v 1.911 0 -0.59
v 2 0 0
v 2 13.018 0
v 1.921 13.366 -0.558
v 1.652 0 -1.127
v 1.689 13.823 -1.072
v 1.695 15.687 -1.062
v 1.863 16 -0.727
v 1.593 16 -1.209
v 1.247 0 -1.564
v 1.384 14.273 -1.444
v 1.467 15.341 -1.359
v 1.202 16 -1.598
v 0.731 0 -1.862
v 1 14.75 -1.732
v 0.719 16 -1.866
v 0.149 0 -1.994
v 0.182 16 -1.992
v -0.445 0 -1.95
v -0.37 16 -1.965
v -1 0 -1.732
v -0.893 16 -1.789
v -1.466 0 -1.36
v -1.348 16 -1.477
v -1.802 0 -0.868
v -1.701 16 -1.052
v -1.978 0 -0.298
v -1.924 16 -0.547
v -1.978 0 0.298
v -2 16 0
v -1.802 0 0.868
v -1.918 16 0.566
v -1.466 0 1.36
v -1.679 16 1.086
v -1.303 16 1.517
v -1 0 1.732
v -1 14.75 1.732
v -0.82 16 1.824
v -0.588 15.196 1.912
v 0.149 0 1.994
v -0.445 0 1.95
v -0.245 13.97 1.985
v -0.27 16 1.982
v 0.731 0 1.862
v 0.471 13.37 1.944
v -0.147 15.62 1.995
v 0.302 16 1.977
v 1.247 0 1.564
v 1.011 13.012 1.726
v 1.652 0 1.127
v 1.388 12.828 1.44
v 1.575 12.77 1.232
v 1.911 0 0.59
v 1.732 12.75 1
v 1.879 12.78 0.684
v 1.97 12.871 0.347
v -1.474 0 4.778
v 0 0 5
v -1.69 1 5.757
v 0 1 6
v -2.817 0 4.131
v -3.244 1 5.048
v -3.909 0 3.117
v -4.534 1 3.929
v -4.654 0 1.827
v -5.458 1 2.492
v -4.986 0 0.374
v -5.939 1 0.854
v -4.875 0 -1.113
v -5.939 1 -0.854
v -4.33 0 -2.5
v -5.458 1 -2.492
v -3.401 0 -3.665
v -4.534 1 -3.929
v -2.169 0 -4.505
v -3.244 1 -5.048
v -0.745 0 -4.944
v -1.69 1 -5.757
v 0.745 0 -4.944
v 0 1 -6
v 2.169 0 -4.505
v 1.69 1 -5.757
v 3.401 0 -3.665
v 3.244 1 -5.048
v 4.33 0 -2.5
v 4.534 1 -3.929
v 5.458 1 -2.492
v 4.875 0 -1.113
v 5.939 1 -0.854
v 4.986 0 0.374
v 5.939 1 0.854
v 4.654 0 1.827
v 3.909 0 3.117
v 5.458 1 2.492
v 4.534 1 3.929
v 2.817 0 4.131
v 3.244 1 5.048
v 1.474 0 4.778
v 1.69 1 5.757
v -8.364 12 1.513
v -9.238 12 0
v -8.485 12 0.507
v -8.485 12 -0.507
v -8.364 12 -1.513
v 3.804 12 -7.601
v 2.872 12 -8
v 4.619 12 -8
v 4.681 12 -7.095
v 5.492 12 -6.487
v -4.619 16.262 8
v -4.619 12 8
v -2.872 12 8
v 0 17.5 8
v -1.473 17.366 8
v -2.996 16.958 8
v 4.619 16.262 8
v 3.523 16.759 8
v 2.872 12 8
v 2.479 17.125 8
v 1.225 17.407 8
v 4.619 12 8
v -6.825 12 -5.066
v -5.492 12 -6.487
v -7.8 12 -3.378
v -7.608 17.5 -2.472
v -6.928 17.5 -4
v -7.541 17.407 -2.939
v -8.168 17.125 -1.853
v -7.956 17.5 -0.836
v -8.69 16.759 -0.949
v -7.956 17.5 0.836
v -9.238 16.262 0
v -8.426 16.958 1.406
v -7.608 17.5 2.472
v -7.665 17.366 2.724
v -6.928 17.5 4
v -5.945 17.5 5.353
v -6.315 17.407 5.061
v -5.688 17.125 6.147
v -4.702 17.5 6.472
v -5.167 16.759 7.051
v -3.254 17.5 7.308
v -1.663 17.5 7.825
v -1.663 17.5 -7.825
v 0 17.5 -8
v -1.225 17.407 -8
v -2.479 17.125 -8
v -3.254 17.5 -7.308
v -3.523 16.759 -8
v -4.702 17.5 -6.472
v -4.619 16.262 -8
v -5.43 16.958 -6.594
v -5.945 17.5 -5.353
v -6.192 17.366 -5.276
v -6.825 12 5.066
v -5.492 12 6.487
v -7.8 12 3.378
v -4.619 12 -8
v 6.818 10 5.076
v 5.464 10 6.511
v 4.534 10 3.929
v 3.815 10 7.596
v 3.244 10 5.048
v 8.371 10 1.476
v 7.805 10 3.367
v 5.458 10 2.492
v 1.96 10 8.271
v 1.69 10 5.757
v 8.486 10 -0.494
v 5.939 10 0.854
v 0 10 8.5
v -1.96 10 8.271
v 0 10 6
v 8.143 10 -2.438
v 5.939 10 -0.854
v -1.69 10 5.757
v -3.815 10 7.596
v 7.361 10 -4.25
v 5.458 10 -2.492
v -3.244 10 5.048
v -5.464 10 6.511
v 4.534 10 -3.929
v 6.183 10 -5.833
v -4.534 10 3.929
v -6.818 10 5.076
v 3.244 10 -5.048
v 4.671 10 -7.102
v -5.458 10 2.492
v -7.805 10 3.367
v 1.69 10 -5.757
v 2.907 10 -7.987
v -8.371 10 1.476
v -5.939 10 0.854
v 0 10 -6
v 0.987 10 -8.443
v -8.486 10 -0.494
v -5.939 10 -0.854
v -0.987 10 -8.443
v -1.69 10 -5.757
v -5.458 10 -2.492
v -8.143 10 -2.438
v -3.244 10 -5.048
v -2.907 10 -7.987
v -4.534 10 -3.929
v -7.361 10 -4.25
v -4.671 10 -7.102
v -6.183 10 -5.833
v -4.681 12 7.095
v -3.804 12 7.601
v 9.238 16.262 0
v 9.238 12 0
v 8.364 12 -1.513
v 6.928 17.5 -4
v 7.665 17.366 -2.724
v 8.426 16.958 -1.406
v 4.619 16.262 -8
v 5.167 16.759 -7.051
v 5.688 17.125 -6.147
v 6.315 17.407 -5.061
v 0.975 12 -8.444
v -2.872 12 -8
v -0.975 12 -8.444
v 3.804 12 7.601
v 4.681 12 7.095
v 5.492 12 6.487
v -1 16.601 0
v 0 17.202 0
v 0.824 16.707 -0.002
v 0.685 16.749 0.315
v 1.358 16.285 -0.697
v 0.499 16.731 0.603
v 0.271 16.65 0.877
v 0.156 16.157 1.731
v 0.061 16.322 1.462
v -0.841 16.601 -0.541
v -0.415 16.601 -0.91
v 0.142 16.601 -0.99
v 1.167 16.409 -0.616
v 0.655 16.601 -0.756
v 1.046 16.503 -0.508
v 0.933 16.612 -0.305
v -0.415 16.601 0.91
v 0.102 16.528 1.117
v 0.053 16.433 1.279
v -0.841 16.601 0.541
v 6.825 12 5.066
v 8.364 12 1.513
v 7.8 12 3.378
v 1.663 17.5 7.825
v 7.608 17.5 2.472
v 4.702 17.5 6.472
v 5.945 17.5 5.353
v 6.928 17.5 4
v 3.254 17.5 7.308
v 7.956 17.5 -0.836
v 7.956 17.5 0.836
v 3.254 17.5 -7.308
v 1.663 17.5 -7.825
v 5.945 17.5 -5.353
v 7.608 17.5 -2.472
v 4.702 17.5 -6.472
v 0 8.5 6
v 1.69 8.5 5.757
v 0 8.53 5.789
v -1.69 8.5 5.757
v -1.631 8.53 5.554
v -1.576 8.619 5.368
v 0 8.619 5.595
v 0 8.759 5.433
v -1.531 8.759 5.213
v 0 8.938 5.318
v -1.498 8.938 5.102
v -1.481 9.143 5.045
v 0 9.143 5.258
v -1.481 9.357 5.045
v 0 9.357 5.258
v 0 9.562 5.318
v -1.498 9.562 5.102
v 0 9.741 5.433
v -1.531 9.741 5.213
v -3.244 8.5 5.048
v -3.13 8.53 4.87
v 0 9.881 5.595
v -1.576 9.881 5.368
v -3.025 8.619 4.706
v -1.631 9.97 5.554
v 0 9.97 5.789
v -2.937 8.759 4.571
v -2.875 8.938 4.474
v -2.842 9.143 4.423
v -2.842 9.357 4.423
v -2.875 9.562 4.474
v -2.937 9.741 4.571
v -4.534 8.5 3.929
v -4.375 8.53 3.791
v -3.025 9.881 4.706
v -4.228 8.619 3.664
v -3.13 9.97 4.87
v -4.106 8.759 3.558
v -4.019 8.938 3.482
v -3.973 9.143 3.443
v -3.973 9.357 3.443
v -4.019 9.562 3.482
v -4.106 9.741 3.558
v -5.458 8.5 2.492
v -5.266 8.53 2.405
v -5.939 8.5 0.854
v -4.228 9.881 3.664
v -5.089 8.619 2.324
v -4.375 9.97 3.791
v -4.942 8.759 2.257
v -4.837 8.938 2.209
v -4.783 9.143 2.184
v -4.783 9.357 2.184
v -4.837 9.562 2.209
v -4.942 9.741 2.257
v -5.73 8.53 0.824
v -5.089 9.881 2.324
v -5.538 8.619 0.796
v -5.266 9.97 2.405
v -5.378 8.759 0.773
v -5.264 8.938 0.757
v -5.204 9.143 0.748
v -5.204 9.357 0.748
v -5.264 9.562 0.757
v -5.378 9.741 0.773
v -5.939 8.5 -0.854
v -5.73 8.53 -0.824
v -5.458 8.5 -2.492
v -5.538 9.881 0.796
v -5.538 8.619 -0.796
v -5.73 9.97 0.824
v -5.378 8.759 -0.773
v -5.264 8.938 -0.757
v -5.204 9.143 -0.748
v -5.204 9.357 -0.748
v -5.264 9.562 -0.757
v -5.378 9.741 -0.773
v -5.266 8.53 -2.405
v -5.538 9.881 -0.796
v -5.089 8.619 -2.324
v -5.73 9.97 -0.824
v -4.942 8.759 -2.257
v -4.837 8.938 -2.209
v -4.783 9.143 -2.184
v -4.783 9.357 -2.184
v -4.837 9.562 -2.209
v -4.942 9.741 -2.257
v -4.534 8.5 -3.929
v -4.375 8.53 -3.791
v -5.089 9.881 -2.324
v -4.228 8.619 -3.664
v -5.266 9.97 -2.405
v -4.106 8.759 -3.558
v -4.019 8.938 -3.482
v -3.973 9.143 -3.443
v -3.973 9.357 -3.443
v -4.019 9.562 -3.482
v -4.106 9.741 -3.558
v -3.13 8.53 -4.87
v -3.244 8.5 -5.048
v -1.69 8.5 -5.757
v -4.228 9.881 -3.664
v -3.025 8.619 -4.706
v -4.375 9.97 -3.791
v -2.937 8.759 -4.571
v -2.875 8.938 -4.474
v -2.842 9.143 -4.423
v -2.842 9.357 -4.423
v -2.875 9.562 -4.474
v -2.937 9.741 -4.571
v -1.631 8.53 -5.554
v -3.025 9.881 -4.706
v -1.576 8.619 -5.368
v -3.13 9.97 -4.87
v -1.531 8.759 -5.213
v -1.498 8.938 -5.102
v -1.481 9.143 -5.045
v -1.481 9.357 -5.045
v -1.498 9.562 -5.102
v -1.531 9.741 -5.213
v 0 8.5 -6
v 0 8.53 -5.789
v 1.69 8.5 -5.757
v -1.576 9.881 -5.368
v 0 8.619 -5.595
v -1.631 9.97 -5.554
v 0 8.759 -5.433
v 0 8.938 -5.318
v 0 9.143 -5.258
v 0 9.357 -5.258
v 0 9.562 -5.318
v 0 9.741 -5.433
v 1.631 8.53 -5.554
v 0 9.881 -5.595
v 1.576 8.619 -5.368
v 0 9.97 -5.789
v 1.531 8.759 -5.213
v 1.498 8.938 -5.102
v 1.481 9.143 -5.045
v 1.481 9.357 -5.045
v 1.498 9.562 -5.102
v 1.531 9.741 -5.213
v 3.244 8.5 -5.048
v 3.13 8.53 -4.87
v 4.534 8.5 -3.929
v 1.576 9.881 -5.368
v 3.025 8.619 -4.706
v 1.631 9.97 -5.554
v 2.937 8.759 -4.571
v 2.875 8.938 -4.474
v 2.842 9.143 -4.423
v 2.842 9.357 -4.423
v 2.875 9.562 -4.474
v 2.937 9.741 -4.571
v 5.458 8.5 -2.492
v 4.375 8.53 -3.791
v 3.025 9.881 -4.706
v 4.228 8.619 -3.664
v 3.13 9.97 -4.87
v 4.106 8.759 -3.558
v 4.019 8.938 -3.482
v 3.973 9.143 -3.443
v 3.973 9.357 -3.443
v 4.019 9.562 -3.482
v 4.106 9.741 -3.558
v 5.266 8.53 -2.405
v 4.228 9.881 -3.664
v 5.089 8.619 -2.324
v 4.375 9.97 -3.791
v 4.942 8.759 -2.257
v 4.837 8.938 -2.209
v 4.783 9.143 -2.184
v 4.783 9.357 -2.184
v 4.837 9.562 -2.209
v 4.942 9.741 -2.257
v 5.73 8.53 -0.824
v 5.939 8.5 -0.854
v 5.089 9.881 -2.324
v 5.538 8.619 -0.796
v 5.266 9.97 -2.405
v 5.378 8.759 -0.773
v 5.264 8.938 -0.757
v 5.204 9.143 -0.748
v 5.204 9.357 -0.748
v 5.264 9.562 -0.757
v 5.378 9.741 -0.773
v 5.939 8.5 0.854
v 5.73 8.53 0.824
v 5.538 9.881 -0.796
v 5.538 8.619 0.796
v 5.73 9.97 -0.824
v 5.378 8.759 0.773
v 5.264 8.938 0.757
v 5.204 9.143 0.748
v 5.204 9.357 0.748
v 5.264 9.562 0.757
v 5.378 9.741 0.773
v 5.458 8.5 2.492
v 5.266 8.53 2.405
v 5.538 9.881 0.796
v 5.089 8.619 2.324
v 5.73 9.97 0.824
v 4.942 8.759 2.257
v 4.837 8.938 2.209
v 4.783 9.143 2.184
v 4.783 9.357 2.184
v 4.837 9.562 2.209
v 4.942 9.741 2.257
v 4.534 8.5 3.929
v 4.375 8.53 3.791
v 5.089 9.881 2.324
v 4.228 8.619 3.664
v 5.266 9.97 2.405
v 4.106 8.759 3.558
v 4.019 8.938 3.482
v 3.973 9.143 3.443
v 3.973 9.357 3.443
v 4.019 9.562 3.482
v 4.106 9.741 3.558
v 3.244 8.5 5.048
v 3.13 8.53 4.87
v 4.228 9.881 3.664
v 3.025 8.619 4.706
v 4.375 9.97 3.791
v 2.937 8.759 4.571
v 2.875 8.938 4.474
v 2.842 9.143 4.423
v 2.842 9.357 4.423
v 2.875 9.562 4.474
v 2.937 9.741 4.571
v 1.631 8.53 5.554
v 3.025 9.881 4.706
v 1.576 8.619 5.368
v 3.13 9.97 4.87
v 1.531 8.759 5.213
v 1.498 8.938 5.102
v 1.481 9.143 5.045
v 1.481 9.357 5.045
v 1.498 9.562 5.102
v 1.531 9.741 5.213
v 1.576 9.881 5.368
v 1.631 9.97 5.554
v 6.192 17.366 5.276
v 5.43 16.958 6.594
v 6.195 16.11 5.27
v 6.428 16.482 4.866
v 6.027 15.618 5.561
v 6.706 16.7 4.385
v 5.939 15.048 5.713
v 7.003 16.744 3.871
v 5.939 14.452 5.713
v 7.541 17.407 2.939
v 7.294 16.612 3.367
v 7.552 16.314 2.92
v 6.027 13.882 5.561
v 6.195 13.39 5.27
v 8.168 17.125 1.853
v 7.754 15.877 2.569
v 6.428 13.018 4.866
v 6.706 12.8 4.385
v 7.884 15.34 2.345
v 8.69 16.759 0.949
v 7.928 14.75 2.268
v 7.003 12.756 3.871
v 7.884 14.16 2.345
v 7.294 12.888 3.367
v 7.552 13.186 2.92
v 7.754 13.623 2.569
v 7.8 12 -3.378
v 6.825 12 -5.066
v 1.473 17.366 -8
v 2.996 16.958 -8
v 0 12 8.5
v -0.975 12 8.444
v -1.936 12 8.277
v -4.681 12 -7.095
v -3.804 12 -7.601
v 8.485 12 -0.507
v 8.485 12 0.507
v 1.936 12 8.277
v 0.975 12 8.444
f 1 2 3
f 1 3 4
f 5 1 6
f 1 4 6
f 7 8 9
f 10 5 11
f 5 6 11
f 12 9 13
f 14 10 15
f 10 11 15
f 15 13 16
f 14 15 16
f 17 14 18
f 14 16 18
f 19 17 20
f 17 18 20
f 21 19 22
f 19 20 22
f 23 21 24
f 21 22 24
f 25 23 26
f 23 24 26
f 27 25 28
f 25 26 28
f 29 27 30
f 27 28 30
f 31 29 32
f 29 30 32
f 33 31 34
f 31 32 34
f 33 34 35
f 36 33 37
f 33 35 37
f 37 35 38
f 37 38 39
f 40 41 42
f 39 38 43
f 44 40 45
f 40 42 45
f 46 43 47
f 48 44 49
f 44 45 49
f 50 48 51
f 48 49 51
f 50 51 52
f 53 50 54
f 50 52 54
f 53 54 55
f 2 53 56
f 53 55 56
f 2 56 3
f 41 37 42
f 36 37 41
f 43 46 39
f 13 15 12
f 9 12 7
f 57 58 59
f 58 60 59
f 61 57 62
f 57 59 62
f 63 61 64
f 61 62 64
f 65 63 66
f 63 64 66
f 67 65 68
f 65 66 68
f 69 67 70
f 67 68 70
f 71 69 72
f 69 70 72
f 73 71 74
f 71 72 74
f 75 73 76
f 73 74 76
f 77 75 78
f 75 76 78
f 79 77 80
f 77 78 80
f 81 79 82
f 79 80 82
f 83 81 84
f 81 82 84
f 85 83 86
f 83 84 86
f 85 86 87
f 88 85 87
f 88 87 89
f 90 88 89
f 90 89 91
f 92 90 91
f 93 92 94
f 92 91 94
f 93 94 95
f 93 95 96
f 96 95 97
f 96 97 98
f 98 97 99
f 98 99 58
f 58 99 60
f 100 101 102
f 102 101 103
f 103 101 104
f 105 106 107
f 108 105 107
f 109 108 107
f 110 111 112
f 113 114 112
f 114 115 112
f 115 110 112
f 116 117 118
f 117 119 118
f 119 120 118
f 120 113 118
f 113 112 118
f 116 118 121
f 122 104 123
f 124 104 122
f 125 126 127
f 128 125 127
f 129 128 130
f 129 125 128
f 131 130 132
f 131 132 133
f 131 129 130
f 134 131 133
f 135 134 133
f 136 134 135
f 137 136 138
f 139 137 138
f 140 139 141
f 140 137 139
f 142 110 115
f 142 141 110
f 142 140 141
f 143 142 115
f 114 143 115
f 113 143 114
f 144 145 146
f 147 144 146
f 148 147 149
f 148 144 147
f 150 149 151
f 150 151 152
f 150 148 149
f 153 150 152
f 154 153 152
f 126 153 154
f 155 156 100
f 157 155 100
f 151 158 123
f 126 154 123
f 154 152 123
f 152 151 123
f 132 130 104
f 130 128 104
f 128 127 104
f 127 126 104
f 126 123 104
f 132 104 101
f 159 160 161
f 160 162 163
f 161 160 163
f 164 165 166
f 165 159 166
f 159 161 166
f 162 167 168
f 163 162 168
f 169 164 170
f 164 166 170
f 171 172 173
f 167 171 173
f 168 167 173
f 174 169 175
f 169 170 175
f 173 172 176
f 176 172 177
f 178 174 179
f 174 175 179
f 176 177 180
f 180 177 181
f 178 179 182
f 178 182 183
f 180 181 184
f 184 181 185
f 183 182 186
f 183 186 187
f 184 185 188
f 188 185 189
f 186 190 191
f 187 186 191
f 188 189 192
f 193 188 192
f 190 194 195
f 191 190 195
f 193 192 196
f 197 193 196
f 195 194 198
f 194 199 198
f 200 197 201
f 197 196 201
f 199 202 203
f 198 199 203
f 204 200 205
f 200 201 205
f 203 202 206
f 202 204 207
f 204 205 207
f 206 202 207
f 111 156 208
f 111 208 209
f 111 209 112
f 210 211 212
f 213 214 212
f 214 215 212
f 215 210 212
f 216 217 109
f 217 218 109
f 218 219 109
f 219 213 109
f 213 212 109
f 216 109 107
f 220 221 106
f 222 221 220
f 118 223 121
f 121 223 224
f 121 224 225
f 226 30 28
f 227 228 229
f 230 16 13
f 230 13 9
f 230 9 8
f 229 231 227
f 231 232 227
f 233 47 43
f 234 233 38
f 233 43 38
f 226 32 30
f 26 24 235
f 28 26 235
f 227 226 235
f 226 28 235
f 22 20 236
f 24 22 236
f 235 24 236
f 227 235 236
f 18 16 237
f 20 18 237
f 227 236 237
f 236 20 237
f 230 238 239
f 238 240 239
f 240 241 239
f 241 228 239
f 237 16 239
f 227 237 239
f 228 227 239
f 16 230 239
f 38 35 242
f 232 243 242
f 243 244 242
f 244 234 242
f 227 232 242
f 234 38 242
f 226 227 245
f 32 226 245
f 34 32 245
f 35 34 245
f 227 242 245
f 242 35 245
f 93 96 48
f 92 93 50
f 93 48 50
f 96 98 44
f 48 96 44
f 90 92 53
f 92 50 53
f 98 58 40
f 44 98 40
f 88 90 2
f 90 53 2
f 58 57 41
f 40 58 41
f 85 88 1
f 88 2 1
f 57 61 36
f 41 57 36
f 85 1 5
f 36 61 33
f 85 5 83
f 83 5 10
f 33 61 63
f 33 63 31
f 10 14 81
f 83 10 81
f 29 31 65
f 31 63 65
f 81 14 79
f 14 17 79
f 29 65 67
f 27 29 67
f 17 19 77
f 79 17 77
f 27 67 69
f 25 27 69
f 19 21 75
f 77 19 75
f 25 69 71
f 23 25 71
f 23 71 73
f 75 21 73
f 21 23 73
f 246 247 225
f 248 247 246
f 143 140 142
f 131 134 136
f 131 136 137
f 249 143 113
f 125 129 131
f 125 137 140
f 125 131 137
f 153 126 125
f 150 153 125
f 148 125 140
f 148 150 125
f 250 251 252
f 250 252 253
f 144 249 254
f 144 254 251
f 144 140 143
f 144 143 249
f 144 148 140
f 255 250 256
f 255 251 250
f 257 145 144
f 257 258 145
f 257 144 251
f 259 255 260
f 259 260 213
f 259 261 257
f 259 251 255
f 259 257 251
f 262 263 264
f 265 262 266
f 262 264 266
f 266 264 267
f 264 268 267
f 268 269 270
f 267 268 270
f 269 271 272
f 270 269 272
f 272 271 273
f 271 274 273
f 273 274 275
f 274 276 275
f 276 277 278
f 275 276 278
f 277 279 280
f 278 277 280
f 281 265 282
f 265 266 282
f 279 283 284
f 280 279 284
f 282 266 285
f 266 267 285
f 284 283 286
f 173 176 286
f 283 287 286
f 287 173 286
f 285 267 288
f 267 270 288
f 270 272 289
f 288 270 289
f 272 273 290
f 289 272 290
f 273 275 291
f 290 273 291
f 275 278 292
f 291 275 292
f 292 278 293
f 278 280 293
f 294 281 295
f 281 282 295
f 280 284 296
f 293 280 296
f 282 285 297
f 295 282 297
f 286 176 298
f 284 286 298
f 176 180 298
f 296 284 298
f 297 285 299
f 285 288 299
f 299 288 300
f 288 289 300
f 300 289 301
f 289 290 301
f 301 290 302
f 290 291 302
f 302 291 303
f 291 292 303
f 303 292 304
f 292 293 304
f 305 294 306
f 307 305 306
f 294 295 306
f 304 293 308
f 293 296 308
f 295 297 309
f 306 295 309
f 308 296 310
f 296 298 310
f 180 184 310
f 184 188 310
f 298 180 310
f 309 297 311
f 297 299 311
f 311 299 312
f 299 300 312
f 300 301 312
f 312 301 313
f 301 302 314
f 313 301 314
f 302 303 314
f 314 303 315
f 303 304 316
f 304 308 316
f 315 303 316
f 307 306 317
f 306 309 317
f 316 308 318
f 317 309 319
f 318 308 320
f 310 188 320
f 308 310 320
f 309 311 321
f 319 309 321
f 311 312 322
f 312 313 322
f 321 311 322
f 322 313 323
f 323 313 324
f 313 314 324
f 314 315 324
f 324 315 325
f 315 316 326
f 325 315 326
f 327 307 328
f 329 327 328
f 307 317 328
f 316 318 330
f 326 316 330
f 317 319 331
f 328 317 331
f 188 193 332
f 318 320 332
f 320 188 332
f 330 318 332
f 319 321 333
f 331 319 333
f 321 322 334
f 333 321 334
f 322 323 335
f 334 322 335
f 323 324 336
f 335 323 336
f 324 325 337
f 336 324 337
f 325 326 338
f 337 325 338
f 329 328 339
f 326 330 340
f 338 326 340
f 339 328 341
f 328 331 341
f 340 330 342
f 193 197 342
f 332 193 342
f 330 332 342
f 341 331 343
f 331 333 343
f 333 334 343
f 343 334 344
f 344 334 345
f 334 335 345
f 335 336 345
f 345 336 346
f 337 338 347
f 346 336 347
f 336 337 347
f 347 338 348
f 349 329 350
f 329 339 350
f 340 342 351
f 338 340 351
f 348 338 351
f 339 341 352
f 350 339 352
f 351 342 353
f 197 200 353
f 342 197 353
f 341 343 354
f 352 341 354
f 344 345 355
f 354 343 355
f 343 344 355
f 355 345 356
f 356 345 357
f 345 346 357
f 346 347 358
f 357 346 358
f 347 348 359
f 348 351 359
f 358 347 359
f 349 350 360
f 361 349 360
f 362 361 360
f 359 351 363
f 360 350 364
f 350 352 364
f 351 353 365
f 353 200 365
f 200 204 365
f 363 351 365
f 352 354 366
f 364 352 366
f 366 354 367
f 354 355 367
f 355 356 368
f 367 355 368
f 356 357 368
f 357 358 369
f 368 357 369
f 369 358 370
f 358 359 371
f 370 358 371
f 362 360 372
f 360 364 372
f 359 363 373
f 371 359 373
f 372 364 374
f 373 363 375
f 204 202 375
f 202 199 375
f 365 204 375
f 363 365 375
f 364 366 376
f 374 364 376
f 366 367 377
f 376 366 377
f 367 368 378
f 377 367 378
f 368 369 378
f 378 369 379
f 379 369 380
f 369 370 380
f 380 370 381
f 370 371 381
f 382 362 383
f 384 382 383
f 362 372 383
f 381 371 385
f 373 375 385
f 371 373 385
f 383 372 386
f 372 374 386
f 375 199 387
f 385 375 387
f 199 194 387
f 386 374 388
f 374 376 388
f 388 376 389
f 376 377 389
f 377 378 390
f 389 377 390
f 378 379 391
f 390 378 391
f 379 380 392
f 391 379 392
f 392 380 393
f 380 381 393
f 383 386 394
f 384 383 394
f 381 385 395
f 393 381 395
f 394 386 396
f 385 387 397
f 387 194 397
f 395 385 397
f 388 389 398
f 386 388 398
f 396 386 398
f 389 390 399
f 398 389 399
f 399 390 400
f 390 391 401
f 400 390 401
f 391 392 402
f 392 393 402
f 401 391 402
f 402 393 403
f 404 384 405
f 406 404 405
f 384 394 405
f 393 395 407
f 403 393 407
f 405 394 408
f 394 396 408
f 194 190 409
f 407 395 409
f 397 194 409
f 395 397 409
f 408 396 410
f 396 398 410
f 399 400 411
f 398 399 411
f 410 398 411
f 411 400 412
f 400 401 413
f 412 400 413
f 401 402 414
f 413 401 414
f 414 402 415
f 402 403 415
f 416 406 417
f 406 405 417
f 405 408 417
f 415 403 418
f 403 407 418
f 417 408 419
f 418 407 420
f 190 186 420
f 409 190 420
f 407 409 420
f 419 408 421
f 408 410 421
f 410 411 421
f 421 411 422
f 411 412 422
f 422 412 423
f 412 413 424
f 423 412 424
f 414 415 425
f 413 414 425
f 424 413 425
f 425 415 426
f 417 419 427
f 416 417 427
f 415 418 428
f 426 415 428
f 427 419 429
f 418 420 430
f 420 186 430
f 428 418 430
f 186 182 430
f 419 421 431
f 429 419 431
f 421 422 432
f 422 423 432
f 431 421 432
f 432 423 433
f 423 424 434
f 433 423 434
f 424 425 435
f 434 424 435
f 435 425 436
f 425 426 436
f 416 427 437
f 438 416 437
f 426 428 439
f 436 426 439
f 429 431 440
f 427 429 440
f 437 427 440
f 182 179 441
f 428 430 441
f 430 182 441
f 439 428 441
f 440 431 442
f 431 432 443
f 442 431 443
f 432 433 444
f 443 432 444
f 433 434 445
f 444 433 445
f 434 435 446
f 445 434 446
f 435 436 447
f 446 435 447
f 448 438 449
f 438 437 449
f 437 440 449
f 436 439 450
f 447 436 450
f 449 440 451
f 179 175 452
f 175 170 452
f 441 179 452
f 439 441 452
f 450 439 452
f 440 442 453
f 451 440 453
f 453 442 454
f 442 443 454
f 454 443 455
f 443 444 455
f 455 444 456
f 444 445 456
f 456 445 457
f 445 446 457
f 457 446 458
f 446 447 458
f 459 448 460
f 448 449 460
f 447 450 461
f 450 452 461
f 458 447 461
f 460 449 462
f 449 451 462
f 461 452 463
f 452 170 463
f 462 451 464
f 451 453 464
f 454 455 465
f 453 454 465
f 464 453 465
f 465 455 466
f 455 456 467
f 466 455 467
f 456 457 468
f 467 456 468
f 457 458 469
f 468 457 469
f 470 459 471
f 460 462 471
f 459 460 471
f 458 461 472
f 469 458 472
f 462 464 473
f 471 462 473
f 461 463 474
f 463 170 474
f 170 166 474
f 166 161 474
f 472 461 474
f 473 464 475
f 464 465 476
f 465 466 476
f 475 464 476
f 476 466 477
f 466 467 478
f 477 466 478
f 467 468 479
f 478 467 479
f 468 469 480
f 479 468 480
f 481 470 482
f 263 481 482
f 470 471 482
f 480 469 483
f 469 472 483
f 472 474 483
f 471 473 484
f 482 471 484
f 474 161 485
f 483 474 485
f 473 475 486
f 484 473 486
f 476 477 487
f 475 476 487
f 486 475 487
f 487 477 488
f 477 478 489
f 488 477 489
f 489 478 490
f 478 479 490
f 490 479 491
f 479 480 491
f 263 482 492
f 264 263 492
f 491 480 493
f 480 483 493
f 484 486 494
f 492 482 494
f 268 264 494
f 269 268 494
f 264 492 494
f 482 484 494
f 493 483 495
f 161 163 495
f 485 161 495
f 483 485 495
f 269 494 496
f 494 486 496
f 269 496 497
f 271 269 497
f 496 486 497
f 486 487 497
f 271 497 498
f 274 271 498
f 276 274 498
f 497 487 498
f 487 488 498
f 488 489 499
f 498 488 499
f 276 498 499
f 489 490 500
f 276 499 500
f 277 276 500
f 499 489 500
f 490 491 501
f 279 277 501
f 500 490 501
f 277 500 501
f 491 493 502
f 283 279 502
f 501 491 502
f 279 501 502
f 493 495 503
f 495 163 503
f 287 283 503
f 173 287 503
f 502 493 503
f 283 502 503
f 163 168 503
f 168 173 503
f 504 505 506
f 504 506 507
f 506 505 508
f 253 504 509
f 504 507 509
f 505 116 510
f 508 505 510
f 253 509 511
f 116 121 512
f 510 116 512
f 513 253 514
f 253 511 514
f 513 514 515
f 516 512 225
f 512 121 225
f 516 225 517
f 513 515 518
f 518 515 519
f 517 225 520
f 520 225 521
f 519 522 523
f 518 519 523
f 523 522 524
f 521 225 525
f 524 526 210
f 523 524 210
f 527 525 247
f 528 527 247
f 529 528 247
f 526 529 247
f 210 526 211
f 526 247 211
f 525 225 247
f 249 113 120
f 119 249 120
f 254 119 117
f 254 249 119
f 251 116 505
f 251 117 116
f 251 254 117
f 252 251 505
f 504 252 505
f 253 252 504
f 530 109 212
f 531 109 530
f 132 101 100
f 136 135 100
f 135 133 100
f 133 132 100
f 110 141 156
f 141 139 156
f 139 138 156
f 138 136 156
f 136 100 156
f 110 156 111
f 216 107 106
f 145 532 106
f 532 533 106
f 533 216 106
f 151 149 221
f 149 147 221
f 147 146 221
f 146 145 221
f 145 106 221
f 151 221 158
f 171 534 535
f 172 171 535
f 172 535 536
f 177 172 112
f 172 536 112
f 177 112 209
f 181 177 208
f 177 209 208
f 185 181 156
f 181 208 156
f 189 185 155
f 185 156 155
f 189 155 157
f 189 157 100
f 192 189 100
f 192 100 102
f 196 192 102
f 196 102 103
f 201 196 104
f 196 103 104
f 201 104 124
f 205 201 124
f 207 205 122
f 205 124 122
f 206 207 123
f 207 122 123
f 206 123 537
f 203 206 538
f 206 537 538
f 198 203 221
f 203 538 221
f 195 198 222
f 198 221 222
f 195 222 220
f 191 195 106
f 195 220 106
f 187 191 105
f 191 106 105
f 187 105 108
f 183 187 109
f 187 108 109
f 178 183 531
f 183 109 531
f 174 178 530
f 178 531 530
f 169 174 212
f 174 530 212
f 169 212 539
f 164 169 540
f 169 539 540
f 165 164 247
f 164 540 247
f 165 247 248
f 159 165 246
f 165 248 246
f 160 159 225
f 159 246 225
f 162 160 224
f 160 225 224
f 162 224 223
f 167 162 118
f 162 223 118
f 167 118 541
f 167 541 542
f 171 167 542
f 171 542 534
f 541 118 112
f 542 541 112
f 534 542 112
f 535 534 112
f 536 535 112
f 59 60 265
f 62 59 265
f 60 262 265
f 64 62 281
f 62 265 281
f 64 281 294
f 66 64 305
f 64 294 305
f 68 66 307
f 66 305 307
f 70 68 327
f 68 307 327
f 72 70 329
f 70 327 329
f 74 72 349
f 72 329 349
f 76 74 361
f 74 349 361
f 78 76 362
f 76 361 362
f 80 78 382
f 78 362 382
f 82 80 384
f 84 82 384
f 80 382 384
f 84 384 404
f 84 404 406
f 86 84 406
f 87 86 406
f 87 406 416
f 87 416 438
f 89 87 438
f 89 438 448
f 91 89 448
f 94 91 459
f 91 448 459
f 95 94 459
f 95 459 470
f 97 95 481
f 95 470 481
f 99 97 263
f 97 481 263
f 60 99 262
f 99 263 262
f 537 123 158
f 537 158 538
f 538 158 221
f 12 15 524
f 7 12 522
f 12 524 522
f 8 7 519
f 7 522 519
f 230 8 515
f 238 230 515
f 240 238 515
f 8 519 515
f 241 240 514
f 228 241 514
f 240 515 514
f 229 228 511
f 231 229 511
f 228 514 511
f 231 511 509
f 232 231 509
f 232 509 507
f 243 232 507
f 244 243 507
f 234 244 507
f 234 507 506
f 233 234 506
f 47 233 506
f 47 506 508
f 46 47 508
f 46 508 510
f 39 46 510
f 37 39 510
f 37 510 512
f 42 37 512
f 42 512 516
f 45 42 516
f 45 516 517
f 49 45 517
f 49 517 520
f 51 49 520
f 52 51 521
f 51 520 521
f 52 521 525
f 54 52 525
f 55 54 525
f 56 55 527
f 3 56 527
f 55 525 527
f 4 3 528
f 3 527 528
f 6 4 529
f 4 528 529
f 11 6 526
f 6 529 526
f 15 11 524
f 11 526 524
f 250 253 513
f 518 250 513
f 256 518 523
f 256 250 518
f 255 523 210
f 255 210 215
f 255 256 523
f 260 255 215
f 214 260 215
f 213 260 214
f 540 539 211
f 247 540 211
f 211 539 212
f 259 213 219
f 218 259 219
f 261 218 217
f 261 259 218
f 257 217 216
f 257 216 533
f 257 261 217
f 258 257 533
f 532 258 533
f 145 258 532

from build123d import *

# Parameters (mm, degrees)
BOSS_EXTRUDE1_DEPTH       = 5.5
SKETCH3_OUTSIDE_W         = 37.596
SKETCH3_OUTSIDE_H         = 36.12
SKETCH3_OUTSIDE_R         = 8
CUT_EXTRUDE1_DEPTH        = 5.5
CUT_EXTRUDE1_DRAFT        = -45
F_4_0MM_DOWEL_HOLE1_D     = 4
F_4_0MM_DOWEL_HOLE1_DEPTH = 16
F_4_0MM_DOWEL_HOLE1_TIP   = 1.201721238
CUT_EXTRUDE2_REACH        = 28.904
SKETCH6_R                 = 2


with BuildPart() as part:
    # Sketch1 → Revolve1 (revolve)
    with BuildSketch(Plane.XY, mode=Mode.PRIVATE) as revolve1_sk:
        with BuildLine():
            Line((0, 0), (-5, 0))
            Line((-5, 0), (-6, 1))
            Line((-6, 1), (-6, 8.5))
            ThreePointArc((-6, 8.5), (-5.25, 9.25), (-6, 10))
            Line((-6, 10), (-8.5, 10))
            Line((-8.5, 10), (-8.5, 12))
            Line((-8.5, 12), (0, 12))
            Line((0, 12), (0, 0))
        make_face()
    revolve(revolve1_sk.sketch.rotate(Axis((0, 12, 0), (0, -1, 0)), 270), axis=Axis((0, 12, 0), (0, -1, 0)))

    # Sketch2 → Boss-Extrude1 (add)
    with BuildSketch(Plane(origin=(0, 12, 0), x_dir=(1, 0, 0), z_dir=(0, 1, 0))):
        Polygon((-4.618802154, 8), (-9.237604307, 0), (-4.618802154, -8), (4.618802154, -8), (9.237604307, 0), (4.618802154, 8), align=None)
    extrude(amount=BOSS_EXTRUDE1_DEPTH)


with BuildPart() as cut_extrude1_tool:
    # Sketch3 outside → Cut-Extrude1 (with draft: the straight prism first)
    with BuildSketch(Plane(origin=(0, 17.5, 0), x_dir=(1, 0, 0), z_dir=(0, 1, 0))):
        Rectangle(SKETCH3_OUTSIDE_W, SKETCH3_OUTSIDE_H)
        Circle(SKETCH3_OUTSIDE_R, mode=Mode.SUBTRACT)
    extrude(amount=-CUT_EXTRUDE1_DEPTH)
    # Cut-Extrude1: the draft: its side faces are tilted about the plane it starts from
    cut_extrude1_sides = [cut_extrude1_tool.faces().sort_by_distance(p)[0] for p in [
        (0, 14.75, 18.06),
        (18.798, 14.75, 0),
        (0, 14.75, -18.06),
        (-18.798, 14.75, 0),
        (-8, 14.75, 0),
    ]]
    draft(cut_extrude1_sides, Plane(origin=(0, 17.5, 0), x_dir=(1, 0, 0), z_dir=(0, 1, 0)), CUT_EXTRUDE1_DRAFT)


with BuildPart() as part_1:
    add(part.part)

    # Cut-Extrude1: cut by cut_extrude1_tool
    add(cut_extrude1_tool.part, mode=Mode.SUBTRACT)

    # Ø4.0mm Dowel Hole1
    with Locations(Plane(origin=(0, 0, 0), x_dir=(-1, 0, 0), z_dir=(0, -1, 0))):
        with Locations((0, 0)):
            Hole(F_4_0MM_DOWEL_HOLE1_D / 2, depth=F_4_0MM_DOWEL_HOLE1_DEPTH)
            with Locations((0, 0, -(F_4_0MM_DOWEL_HOLE1_DEPTH + F_4_0MM_DOWEL_HOLE1_TIP / 2))):  # 118° drill point
                Cone(0, F_4_0MM_DOWEL_HOLE1_D / 2, F_4_0MM_DOWEL_HOLE1_TIP, mode=Mode.SUBTRACT)

    # Sketch6 → Cut-Extrude2 (cut, up to next)
    with BuildSketch(Plane(origin=(6.92820323, 0, 4), x_dir=(0.5, 0, -0.8660254037844386), z_dir=(0.8660254037844387, 0, 0.5000000000000001)), mode=Mode.PRIVATE) as cut_extrude2_sk1:
        with Locations((0, 14.75)):
            Circle(SKETCH6_R)
    cut_extrude2_tool1 = extrude(cut_extrude2_sk1.sketch, amount=-CUT_EXTRUDE2_REACH, mode=Mode.PRIVATE) & part_1.part
    add(cut_extrude2_tool1.solids().sort_by_distance((6.928203, 14.75, 4))[0], mode=Mode.SUBTRACT)


solid = part_1.part
